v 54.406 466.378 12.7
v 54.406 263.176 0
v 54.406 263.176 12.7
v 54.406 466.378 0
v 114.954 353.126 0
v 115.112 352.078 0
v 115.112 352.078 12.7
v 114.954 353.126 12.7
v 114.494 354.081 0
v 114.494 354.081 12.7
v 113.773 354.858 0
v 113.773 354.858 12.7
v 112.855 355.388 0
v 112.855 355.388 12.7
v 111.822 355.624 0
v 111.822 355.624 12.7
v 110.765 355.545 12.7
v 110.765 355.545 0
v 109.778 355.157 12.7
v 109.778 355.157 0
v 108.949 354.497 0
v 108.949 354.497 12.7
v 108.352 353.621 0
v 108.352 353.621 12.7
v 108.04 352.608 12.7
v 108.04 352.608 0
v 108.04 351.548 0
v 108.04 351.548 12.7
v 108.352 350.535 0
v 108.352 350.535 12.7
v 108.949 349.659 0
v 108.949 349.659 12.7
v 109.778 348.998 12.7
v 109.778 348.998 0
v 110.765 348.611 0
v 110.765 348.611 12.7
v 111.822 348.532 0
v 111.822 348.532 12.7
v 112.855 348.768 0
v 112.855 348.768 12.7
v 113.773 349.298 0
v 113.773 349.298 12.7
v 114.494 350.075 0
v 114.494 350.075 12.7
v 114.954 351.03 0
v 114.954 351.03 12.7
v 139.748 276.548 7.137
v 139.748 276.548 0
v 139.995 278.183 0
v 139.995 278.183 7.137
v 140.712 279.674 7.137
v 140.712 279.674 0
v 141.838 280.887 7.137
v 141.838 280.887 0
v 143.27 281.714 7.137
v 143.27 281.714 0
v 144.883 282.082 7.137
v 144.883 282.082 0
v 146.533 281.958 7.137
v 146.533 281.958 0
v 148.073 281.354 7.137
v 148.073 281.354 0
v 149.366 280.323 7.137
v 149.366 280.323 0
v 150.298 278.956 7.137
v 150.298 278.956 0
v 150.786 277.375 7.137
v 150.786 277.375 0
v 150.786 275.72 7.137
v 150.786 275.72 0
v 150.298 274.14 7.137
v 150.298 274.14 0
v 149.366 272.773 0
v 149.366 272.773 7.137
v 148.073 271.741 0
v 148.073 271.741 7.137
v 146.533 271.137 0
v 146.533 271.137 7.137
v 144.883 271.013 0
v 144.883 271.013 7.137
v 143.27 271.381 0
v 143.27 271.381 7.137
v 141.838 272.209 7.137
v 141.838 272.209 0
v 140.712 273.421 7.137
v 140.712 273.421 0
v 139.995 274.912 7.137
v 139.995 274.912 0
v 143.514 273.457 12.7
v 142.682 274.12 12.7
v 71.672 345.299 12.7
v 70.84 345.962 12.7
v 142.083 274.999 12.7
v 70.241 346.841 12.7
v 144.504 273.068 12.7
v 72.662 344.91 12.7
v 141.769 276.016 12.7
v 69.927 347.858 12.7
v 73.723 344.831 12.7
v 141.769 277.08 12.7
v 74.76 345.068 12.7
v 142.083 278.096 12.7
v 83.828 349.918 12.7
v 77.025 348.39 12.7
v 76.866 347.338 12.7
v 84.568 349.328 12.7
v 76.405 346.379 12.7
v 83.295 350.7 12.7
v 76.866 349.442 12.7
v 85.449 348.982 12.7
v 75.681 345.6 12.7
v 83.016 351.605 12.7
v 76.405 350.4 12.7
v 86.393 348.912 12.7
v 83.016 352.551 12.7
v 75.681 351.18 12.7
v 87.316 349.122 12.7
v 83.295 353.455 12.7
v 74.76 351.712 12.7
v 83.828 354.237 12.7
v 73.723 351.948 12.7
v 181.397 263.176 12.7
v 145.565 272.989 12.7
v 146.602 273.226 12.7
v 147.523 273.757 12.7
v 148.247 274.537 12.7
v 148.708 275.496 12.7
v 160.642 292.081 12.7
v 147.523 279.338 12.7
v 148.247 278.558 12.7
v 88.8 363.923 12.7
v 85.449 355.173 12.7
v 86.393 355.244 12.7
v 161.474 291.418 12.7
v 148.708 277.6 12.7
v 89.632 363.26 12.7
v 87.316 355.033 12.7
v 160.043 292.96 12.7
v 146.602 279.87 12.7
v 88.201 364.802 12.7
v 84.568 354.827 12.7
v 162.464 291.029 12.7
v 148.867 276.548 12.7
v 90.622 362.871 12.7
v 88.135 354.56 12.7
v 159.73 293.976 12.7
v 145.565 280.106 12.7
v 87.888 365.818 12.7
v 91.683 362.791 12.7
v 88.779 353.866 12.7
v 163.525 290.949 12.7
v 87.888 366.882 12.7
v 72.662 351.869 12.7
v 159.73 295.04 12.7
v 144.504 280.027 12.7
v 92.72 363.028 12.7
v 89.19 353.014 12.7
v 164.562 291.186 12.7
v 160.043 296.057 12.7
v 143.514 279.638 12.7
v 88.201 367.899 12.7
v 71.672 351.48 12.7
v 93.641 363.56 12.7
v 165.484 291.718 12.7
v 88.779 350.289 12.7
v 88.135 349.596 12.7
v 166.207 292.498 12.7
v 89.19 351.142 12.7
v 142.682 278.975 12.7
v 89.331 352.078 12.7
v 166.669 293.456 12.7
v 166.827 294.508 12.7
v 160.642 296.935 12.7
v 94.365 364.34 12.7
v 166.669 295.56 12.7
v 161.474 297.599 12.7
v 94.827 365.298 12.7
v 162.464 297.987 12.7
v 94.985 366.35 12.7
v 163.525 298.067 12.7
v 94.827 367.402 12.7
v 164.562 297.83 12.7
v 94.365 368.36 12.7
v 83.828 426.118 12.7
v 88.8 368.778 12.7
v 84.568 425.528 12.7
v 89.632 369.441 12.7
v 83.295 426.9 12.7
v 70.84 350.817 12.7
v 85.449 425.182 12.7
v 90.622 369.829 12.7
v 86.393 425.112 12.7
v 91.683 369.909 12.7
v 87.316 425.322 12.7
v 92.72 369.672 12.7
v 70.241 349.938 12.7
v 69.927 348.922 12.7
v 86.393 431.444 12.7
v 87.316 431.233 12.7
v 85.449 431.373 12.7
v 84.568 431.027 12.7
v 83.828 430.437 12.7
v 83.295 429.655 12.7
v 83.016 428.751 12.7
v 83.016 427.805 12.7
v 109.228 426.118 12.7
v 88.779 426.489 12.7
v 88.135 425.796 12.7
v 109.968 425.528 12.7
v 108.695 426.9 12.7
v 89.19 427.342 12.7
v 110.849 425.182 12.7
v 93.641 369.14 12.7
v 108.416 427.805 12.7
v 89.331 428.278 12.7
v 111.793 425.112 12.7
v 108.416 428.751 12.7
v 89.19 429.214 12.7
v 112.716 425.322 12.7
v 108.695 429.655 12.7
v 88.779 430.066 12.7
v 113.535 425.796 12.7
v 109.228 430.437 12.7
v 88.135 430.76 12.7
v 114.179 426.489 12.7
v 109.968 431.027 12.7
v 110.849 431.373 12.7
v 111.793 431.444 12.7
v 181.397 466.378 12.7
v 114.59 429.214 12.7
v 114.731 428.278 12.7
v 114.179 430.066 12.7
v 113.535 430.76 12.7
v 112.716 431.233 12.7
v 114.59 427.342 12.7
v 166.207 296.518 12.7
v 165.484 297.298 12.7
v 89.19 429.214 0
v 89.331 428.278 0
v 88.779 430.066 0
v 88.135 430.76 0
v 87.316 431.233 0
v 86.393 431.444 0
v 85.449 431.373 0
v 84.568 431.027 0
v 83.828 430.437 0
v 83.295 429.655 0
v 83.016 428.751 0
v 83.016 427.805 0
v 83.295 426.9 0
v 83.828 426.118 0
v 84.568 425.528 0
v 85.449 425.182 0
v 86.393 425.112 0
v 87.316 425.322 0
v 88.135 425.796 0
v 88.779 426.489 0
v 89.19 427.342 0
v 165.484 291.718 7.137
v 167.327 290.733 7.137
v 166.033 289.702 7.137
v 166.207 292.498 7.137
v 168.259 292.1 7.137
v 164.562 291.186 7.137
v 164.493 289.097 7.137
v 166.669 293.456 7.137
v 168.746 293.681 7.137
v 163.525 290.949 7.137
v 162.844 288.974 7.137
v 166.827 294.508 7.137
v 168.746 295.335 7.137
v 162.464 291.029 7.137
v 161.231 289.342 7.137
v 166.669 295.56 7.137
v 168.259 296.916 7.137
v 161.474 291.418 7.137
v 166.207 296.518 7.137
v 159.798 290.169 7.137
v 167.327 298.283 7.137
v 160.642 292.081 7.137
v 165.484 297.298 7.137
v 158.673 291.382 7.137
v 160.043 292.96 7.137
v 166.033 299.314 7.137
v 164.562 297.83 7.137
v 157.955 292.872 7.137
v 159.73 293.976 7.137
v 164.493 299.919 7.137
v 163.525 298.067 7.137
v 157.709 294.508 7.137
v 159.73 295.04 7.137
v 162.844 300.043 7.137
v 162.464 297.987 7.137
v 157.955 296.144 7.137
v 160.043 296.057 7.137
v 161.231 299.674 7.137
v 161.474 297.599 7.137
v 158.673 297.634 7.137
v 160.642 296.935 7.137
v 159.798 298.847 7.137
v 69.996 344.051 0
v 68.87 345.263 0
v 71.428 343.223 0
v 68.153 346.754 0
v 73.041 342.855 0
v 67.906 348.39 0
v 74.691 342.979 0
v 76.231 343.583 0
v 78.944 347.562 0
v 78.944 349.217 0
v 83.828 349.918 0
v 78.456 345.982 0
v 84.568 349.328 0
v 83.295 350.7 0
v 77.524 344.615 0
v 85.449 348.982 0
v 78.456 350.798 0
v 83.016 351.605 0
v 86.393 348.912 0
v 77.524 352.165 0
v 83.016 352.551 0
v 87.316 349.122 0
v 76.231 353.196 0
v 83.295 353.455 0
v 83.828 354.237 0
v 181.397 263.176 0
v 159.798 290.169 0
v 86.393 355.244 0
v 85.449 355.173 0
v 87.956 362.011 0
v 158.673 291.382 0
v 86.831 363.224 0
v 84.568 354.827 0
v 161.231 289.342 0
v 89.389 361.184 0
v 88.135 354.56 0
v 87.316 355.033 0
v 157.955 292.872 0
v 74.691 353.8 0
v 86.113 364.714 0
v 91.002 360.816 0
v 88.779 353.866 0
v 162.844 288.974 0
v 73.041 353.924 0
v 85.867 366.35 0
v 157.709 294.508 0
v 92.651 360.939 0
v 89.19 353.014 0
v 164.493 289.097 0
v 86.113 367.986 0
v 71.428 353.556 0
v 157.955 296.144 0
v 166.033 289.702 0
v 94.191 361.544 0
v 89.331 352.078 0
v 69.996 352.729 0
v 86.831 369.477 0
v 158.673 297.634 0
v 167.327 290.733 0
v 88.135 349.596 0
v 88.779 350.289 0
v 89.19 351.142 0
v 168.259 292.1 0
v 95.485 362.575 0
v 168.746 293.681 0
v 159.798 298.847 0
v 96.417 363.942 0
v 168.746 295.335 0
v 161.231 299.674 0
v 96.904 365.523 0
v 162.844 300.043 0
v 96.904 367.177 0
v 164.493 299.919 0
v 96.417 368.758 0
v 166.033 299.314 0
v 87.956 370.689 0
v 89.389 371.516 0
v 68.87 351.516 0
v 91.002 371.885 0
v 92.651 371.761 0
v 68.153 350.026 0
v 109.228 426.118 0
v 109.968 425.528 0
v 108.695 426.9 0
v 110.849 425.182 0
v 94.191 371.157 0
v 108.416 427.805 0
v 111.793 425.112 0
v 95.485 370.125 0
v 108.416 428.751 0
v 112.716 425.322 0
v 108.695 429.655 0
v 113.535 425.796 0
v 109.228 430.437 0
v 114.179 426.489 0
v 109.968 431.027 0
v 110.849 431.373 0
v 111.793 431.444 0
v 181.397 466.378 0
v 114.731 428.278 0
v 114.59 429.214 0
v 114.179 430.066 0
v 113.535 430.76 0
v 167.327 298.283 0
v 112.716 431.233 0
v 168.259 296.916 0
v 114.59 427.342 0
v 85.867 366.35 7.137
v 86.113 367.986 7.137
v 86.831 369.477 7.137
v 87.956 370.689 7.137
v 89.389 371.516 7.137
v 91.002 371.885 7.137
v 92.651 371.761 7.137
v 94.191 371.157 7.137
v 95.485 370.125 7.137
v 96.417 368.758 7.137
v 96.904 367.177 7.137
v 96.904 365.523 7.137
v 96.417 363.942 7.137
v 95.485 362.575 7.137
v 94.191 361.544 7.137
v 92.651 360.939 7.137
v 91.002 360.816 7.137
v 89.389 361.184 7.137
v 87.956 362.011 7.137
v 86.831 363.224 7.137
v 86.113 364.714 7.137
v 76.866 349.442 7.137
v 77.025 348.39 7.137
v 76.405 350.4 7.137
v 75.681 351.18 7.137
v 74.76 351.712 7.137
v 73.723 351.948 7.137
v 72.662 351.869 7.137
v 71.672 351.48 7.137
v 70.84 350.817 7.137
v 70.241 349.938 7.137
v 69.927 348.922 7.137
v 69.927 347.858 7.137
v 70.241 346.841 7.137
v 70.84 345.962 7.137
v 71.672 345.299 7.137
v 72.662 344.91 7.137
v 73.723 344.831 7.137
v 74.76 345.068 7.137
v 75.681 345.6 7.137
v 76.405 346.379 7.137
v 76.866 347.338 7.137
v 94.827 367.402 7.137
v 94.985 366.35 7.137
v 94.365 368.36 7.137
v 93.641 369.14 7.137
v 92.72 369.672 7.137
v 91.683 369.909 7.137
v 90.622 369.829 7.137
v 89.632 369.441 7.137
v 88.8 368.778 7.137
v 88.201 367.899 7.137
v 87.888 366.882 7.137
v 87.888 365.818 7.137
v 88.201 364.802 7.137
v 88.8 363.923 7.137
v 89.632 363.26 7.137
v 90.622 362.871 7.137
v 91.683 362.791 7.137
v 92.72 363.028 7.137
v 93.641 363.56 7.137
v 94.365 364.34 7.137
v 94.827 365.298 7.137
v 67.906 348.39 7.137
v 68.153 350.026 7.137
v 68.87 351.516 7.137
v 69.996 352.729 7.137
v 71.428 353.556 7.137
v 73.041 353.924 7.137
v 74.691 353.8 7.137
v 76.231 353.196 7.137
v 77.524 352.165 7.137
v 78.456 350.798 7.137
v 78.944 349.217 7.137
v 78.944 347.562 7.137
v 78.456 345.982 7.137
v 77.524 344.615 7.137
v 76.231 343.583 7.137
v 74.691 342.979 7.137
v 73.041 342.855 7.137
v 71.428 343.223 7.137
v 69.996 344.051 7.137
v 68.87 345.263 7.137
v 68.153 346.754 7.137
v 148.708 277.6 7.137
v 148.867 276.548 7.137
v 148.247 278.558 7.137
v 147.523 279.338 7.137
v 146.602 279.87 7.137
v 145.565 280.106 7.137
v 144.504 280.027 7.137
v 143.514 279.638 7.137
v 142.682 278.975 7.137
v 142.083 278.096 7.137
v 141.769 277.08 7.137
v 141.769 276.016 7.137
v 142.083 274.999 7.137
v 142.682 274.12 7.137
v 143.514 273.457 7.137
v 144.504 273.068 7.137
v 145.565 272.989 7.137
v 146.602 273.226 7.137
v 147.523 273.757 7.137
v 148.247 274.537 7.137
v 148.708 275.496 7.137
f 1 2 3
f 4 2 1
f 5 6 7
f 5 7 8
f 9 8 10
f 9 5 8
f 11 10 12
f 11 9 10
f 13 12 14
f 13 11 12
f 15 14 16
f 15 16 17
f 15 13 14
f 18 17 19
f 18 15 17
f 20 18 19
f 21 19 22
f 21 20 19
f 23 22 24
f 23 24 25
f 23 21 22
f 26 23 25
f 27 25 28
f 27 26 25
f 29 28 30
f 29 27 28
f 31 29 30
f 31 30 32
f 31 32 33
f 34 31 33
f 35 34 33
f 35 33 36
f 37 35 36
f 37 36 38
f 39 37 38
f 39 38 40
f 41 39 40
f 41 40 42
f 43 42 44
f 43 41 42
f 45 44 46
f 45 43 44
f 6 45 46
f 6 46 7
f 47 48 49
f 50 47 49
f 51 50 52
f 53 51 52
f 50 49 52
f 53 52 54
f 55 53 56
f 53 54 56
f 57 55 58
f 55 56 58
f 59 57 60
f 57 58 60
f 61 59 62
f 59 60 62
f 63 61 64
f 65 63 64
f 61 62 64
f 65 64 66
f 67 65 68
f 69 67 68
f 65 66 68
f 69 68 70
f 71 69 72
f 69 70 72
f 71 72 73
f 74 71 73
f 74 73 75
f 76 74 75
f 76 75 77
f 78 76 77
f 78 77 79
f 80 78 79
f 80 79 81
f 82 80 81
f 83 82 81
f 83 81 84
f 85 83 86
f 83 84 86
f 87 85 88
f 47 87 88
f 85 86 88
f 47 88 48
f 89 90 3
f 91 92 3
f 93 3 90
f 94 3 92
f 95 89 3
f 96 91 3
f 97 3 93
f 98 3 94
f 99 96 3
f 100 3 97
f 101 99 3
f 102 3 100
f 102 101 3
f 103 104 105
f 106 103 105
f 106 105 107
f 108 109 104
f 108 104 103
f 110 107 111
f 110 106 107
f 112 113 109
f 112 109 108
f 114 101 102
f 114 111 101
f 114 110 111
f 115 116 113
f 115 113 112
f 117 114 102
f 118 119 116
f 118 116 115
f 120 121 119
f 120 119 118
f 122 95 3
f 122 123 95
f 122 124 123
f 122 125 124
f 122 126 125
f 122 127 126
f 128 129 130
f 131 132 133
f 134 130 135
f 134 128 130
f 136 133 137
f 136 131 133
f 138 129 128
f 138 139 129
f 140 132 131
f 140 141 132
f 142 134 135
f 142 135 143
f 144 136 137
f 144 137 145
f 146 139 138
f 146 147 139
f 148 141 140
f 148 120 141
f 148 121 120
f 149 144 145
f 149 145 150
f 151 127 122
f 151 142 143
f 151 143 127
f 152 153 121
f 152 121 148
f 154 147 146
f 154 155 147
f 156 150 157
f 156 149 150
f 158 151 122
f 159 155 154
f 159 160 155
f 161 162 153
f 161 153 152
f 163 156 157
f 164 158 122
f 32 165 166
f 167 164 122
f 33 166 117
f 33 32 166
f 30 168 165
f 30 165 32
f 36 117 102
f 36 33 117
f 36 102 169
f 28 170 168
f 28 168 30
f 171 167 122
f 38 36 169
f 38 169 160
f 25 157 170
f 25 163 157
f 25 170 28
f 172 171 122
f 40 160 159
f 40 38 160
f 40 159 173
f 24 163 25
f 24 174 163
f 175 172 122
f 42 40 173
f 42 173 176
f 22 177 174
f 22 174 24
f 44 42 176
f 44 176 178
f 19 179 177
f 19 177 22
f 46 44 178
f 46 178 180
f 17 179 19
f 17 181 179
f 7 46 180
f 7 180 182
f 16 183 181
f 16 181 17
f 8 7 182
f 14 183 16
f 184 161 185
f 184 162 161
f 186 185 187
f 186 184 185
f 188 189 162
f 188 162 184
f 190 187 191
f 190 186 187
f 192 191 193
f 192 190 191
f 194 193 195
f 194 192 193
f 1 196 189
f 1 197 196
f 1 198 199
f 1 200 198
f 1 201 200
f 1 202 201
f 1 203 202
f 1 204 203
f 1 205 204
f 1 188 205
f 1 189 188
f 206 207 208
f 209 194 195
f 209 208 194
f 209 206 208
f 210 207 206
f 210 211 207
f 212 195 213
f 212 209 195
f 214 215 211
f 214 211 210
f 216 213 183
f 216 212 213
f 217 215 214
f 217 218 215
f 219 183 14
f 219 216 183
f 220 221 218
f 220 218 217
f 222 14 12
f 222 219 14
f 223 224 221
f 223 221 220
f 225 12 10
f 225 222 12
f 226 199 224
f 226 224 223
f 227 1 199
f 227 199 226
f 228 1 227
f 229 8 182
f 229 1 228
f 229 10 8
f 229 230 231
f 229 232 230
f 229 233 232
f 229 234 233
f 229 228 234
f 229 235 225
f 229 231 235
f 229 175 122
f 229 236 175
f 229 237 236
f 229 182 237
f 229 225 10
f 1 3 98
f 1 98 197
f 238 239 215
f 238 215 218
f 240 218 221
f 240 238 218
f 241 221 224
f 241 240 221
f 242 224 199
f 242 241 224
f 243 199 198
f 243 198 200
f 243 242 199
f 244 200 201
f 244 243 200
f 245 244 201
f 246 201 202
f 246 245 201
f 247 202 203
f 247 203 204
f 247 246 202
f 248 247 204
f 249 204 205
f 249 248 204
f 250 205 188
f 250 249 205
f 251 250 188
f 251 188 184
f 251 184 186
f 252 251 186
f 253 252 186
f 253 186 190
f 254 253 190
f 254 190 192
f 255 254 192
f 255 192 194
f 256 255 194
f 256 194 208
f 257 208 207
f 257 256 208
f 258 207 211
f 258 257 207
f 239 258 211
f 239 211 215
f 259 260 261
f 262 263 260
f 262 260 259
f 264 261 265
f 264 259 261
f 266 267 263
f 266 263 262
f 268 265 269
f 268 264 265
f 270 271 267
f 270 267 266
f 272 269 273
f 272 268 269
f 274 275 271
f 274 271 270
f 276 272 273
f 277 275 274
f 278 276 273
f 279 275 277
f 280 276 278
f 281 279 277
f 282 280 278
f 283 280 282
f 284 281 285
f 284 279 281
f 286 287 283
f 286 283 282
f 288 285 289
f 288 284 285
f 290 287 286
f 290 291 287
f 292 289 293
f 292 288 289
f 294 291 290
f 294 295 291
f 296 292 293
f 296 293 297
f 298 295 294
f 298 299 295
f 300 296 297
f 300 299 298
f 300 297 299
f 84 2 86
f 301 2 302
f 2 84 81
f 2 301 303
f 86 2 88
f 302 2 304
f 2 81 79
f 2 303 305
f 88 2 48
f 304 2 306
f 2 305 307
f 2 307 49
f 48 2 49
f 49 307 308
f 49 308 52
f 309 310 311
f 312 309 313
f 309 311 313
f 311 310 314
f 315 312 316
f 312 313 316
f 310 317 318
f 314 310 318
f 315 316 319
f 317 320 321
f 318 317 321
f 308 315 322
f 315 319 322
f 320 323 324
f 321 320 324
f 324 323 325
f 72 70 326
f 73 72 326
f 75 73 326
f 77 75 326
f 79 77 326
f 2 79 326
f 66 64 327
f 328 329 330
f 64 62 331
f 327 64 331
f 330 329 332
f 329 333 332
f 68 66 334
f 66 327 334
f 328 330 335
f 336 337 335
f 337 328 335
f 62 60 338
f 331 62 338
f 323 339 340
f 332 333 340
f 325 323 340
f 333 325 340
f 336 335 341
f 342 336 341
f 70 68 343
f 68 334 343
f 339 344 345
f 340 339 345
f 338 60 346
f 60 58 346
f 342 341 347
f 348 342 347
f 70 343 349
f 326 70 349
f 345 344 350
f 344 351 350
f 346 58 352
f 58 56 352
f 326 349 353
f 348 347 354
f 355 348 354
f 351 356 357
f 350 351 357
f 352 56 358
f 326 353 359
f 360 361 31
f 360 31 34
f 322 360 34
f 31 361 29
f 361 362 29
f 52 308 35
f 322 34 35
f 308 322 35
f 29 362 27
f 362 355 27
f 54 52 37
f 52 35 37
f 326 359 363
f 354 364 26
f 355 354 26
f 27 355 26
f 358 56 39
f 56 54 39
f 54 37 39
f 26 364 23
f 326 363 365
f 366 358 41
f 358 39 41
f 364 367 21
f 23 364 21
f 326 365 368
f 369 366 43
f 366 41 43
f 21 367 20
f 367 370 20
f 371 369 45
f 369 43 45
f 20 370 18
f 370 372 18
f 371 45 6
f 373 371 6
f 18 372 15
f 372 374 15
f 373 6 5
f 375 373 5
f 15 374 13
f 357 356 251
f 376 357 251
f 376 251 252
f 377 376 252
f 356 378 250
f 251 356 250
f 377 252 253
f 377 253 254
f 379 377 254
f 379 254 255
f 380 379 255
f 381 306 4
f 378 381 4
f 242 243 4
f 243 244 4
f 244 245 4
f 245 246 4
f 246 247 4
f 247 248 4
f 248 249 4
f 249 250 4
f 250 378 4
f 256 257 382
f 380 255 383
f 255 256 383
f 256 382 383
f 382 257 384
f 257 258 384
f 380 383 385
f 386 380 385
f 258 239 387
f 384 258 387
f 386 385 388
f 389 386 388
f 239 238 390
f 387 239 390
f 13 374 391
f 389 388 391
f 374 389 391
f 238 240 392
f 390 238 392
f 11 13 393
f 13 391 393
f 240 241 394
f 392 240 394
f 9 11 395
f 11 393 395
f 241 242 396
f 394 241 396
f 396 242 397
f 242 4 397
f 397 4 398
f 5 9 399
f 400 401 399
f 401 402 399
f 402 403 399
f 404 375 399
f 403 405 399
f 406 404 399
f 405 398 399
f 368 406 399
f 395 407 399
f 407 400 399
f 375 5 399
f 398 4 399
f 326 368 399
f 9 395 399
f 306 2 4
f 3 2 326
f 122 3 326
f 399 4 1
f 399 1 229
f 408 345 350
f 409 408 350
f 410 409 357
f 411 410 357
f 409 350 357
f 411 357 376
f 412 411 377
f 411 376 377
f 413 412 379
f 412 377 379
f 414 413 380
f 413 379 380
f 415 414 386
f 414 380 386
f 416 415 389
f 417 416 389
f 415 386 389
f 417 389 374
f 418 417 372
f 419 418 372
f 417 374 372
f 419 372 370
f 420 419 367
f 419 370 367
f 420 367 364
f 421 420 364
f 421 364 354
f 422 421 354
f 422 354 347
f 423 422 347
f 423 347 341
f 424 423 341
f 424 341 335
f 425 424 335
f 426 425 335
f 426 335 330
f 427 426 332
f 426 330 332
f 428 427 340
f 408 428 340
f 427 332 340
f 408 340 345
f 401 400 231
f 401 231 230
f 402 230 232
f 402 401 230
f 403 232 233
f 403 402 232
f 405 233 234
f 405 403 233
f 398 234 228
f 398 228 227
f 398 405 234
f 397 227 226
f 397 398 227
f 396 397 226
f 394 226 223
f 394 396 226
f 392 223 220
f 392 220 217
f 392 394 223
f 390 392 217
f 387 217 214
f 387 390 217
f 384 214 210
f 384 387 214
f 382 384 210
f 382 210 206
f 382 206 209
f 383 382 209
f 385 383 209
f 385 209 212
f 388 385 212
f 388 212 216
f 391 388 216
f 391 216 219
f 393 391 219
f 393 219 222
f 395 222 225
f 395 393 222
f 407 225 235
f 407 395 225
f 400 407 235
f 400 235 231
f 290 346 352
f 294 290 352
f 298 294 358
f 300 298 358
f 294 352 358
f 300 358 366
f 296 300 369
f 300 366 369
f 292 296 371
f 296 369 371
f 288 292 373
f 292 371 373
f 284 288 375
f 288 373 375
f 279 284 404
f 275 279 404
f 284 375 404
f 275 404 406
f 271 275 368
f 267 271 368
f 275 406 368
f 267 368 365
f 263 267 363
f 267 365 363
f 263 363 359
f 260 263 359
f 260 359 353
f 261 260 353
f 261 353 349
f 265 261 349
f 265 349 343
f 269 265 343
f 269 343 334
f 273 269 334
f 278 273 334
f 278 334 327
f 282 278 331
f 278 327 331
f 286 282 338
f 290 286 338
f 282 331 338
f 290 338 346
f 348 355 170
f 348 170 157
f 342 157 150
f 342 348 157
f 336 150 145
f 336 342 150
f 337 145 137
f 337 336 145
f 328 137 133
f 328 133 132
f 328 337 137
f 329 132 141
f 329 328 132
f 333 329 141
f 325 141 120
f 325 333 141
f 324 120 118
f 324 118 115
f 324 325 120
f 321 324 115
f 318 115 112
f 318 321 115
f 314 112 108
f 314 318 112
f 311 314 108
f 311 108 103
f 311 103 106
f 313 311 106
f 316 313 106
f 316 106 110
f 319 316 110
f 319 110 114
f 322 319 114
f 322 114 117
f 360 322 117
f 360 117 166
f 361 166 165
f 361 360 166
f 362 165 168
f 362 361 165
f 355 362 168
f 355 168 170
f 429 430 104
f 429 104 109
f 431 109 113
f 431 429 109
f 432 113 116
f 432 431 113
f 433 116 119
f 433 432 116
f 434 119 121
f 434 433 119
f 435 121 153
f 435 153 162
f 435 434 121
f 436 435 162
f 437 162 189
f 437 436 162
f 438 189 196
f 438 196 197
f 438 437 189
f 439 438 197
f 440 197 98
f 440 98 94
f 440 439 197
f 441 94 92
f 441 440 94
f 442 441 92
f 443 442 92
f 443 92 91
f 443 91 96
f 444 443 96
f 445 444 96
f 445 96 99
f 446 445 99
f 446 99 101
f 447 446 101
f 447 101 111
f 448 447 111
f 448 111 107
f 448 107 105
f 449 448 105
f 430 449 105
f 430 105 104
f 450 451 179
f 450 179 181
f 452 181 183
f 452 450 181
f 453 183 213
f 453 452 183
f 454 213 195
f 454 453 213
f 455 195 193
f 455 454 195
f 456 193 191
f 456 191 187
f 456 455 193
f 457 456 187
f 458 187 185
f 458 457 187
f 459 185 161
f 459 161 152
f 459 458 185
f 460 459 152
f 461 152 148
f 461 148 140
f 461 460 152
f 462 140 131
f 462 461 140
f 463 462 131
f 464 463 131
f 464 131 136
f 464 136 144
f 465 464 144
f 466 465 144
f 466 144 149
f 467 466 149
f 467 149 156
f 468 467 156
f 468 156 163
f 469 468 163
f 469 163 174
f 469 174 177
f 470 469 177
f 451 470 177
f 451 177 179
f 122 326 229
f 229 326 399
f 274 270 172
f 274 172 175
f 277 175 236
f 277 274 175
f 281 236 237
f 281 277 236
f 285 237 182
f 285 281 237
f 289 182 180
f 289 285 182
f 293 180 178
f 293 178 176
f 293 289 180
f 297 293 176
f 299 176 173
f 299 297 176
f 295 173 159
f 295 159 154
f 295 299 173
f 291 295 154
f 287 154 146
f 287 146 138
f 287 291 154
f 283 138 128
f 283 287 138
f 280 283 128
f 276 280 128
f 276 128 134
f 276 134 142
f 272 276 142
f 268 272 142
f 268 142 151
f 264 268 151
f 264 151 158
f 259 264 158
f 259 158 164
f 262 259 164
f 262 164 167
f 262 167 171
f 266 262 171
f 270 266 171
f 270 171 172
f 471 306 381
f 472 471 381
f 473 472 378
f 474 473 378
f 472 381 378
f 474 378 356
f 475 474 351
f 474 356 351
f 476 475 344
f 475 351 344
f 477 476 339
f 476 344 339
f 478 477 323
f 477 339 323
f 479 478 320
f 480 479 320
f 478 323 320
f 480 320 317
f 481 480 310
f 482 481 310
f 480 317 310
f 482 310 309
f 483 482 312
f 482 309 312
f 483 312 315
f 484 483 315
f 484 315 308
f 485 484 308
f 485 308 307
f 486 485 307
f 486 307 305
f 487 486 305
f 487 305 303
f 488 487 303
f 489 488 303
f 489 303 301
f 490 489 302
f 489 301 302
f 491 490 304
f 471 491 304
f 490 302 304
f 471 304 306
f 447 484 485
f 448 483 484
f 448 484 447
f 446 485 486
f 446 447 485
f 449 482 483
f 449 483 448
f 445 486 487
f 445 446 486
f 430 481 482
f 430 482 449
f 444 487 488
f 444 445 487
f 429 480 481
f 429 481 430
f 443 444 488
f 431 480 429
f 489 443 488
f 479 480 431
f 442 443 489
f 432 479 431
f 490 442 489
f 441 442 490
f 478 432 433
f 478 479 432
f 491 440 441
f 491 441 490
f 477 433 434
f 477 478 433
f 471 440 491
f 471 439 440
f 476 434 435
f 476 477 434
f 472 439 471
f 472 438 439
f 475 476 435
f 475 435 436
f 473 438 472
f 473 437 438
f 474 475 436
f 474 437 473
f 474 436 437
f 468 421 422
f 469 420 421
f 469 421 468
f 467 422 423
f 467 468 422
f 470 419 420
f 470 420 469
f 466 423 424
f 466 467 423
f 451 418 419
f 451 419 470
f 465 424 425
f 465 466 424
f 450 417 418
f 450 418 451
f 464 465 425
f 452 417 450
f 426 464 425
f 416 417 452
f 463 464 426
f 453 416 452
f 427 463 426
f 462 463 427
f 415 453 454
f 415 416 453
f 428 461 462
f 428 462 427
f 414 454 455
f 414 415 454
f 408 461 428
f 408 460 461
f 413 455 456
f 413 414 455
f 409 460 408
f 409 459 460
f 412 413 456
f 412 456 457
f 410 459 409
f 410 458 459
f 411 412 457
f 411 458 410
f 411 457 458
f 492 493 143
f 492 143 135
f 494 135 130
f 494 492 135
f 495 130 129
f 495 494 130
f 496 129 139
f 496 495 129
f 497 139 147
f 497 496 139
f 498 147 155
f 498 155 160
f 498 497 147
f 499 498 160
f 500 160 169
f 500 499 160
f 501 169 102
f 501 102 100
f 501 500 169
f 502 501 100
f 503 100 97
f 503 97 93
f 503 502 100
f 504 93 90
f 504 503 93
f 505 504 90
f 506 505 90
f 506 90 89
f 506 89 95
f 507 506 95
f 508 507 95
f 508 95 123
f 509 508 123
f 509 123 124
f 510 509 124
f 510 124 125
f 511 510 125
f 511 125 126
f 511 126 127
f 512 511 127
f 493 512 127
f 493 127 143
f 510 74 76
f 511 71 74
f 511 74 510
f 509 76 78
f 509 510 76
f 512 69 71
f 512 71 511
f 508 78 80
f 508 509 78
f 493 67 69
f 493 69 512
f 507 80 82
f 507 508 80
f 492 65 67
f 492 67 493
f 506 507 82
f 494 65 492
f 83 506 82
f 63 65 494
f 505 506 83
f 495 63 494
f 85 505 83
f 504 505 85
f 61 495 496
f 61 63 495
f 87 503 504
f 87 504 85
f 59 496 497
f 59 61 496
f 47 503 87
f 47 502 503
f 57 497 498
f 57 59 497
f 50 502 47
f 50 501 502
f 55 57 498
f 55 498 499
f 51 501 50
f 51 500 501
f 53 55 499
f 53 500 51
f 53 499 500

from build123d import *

# Parameters (mm, degrees)
SKETCH1_W           = 126.991036612
SKETCH1_H           = 203.20170097
SKETCH1_R           = 3.5687
SKETCH1_R_2         = 3.175
SKETCH1_R_3         = 3.556
BOSS_EXTRUDE1_DEPTH = 12.7
SKETCH2_R           = 5.5499
CUT_EXTRUDE1_DEPTH  = 7.1374


with BuildPart() as part:
    # Sketch1 → Boss-Extrude1 (new body)
    with BuildSketch(Plane.XY):
        with Locations((117.901436969, 364.776968974)):
            Rectangle(SKETCH1_W, SKETCH1_H)
        with Locations((163.258479874, 294.508127154)):
            Circle(SKETCH1_R, mode=Mode.SUBTRACT)
        with Locations((145.297967632, 276.547614912)):
            Circle(SKETCH1_R, mode=Mode.SUBTRACT)
        with Locations((91.416430905, 366.350176123)):
            Circle(SKETCH1_R, mode=Mode.SUBTRACT)
        with Locations((73.455918663, 348.389663881)):
            Circle(SKETCH1_R, mode=Mode.SUBTRACT)
        with Locations((86.155918663, 428.277819459)):
            Circle(SKETCH1_R_2, mode=Mode.SUBTRACT)
        with Locations((111.555918663, 428.277819459)):
            Circle(SKETCH1_R_2, mode=Mode.SUBTRACT)
        with Locations((86.155918663, 352.077819459)):
            Circle(SKETCH1_R_2, mode=Mode.SUBTRACT)
        with Locations((111.555918663, 352.077819459)):
            Circle(SKETCH1_R_3, mode=Mode.SUBTRACT)
    extrude(amount=BOSS_EXTRUDE1_DEPTH)

    # Sketch2 → Cut-Extrude1 (cut)
    with BuildSketch(Plane(origin=(0, 0, 0), x_dir=(-1, 0, 0), z_dir=(0, 0, -1))):
        with Locations((-91.416430905, 366.350176123)):
            Circle(SKETCH2_R)
        with Locations((-73.455918663, 348.389663881)):
            Circle(SKETCH2_R)
        with Locations((-163.258479874, 294.508127154)):
            Circle(SKETCH2_R)
        with Locations((-145.297967632, 276.547614912)):
            Circle(SKETCH2_R)
    extrude(amount=-CUT_EXTRUDE1_DEPTH, mode=Mode.SUBTRACT)


solid = part.part
